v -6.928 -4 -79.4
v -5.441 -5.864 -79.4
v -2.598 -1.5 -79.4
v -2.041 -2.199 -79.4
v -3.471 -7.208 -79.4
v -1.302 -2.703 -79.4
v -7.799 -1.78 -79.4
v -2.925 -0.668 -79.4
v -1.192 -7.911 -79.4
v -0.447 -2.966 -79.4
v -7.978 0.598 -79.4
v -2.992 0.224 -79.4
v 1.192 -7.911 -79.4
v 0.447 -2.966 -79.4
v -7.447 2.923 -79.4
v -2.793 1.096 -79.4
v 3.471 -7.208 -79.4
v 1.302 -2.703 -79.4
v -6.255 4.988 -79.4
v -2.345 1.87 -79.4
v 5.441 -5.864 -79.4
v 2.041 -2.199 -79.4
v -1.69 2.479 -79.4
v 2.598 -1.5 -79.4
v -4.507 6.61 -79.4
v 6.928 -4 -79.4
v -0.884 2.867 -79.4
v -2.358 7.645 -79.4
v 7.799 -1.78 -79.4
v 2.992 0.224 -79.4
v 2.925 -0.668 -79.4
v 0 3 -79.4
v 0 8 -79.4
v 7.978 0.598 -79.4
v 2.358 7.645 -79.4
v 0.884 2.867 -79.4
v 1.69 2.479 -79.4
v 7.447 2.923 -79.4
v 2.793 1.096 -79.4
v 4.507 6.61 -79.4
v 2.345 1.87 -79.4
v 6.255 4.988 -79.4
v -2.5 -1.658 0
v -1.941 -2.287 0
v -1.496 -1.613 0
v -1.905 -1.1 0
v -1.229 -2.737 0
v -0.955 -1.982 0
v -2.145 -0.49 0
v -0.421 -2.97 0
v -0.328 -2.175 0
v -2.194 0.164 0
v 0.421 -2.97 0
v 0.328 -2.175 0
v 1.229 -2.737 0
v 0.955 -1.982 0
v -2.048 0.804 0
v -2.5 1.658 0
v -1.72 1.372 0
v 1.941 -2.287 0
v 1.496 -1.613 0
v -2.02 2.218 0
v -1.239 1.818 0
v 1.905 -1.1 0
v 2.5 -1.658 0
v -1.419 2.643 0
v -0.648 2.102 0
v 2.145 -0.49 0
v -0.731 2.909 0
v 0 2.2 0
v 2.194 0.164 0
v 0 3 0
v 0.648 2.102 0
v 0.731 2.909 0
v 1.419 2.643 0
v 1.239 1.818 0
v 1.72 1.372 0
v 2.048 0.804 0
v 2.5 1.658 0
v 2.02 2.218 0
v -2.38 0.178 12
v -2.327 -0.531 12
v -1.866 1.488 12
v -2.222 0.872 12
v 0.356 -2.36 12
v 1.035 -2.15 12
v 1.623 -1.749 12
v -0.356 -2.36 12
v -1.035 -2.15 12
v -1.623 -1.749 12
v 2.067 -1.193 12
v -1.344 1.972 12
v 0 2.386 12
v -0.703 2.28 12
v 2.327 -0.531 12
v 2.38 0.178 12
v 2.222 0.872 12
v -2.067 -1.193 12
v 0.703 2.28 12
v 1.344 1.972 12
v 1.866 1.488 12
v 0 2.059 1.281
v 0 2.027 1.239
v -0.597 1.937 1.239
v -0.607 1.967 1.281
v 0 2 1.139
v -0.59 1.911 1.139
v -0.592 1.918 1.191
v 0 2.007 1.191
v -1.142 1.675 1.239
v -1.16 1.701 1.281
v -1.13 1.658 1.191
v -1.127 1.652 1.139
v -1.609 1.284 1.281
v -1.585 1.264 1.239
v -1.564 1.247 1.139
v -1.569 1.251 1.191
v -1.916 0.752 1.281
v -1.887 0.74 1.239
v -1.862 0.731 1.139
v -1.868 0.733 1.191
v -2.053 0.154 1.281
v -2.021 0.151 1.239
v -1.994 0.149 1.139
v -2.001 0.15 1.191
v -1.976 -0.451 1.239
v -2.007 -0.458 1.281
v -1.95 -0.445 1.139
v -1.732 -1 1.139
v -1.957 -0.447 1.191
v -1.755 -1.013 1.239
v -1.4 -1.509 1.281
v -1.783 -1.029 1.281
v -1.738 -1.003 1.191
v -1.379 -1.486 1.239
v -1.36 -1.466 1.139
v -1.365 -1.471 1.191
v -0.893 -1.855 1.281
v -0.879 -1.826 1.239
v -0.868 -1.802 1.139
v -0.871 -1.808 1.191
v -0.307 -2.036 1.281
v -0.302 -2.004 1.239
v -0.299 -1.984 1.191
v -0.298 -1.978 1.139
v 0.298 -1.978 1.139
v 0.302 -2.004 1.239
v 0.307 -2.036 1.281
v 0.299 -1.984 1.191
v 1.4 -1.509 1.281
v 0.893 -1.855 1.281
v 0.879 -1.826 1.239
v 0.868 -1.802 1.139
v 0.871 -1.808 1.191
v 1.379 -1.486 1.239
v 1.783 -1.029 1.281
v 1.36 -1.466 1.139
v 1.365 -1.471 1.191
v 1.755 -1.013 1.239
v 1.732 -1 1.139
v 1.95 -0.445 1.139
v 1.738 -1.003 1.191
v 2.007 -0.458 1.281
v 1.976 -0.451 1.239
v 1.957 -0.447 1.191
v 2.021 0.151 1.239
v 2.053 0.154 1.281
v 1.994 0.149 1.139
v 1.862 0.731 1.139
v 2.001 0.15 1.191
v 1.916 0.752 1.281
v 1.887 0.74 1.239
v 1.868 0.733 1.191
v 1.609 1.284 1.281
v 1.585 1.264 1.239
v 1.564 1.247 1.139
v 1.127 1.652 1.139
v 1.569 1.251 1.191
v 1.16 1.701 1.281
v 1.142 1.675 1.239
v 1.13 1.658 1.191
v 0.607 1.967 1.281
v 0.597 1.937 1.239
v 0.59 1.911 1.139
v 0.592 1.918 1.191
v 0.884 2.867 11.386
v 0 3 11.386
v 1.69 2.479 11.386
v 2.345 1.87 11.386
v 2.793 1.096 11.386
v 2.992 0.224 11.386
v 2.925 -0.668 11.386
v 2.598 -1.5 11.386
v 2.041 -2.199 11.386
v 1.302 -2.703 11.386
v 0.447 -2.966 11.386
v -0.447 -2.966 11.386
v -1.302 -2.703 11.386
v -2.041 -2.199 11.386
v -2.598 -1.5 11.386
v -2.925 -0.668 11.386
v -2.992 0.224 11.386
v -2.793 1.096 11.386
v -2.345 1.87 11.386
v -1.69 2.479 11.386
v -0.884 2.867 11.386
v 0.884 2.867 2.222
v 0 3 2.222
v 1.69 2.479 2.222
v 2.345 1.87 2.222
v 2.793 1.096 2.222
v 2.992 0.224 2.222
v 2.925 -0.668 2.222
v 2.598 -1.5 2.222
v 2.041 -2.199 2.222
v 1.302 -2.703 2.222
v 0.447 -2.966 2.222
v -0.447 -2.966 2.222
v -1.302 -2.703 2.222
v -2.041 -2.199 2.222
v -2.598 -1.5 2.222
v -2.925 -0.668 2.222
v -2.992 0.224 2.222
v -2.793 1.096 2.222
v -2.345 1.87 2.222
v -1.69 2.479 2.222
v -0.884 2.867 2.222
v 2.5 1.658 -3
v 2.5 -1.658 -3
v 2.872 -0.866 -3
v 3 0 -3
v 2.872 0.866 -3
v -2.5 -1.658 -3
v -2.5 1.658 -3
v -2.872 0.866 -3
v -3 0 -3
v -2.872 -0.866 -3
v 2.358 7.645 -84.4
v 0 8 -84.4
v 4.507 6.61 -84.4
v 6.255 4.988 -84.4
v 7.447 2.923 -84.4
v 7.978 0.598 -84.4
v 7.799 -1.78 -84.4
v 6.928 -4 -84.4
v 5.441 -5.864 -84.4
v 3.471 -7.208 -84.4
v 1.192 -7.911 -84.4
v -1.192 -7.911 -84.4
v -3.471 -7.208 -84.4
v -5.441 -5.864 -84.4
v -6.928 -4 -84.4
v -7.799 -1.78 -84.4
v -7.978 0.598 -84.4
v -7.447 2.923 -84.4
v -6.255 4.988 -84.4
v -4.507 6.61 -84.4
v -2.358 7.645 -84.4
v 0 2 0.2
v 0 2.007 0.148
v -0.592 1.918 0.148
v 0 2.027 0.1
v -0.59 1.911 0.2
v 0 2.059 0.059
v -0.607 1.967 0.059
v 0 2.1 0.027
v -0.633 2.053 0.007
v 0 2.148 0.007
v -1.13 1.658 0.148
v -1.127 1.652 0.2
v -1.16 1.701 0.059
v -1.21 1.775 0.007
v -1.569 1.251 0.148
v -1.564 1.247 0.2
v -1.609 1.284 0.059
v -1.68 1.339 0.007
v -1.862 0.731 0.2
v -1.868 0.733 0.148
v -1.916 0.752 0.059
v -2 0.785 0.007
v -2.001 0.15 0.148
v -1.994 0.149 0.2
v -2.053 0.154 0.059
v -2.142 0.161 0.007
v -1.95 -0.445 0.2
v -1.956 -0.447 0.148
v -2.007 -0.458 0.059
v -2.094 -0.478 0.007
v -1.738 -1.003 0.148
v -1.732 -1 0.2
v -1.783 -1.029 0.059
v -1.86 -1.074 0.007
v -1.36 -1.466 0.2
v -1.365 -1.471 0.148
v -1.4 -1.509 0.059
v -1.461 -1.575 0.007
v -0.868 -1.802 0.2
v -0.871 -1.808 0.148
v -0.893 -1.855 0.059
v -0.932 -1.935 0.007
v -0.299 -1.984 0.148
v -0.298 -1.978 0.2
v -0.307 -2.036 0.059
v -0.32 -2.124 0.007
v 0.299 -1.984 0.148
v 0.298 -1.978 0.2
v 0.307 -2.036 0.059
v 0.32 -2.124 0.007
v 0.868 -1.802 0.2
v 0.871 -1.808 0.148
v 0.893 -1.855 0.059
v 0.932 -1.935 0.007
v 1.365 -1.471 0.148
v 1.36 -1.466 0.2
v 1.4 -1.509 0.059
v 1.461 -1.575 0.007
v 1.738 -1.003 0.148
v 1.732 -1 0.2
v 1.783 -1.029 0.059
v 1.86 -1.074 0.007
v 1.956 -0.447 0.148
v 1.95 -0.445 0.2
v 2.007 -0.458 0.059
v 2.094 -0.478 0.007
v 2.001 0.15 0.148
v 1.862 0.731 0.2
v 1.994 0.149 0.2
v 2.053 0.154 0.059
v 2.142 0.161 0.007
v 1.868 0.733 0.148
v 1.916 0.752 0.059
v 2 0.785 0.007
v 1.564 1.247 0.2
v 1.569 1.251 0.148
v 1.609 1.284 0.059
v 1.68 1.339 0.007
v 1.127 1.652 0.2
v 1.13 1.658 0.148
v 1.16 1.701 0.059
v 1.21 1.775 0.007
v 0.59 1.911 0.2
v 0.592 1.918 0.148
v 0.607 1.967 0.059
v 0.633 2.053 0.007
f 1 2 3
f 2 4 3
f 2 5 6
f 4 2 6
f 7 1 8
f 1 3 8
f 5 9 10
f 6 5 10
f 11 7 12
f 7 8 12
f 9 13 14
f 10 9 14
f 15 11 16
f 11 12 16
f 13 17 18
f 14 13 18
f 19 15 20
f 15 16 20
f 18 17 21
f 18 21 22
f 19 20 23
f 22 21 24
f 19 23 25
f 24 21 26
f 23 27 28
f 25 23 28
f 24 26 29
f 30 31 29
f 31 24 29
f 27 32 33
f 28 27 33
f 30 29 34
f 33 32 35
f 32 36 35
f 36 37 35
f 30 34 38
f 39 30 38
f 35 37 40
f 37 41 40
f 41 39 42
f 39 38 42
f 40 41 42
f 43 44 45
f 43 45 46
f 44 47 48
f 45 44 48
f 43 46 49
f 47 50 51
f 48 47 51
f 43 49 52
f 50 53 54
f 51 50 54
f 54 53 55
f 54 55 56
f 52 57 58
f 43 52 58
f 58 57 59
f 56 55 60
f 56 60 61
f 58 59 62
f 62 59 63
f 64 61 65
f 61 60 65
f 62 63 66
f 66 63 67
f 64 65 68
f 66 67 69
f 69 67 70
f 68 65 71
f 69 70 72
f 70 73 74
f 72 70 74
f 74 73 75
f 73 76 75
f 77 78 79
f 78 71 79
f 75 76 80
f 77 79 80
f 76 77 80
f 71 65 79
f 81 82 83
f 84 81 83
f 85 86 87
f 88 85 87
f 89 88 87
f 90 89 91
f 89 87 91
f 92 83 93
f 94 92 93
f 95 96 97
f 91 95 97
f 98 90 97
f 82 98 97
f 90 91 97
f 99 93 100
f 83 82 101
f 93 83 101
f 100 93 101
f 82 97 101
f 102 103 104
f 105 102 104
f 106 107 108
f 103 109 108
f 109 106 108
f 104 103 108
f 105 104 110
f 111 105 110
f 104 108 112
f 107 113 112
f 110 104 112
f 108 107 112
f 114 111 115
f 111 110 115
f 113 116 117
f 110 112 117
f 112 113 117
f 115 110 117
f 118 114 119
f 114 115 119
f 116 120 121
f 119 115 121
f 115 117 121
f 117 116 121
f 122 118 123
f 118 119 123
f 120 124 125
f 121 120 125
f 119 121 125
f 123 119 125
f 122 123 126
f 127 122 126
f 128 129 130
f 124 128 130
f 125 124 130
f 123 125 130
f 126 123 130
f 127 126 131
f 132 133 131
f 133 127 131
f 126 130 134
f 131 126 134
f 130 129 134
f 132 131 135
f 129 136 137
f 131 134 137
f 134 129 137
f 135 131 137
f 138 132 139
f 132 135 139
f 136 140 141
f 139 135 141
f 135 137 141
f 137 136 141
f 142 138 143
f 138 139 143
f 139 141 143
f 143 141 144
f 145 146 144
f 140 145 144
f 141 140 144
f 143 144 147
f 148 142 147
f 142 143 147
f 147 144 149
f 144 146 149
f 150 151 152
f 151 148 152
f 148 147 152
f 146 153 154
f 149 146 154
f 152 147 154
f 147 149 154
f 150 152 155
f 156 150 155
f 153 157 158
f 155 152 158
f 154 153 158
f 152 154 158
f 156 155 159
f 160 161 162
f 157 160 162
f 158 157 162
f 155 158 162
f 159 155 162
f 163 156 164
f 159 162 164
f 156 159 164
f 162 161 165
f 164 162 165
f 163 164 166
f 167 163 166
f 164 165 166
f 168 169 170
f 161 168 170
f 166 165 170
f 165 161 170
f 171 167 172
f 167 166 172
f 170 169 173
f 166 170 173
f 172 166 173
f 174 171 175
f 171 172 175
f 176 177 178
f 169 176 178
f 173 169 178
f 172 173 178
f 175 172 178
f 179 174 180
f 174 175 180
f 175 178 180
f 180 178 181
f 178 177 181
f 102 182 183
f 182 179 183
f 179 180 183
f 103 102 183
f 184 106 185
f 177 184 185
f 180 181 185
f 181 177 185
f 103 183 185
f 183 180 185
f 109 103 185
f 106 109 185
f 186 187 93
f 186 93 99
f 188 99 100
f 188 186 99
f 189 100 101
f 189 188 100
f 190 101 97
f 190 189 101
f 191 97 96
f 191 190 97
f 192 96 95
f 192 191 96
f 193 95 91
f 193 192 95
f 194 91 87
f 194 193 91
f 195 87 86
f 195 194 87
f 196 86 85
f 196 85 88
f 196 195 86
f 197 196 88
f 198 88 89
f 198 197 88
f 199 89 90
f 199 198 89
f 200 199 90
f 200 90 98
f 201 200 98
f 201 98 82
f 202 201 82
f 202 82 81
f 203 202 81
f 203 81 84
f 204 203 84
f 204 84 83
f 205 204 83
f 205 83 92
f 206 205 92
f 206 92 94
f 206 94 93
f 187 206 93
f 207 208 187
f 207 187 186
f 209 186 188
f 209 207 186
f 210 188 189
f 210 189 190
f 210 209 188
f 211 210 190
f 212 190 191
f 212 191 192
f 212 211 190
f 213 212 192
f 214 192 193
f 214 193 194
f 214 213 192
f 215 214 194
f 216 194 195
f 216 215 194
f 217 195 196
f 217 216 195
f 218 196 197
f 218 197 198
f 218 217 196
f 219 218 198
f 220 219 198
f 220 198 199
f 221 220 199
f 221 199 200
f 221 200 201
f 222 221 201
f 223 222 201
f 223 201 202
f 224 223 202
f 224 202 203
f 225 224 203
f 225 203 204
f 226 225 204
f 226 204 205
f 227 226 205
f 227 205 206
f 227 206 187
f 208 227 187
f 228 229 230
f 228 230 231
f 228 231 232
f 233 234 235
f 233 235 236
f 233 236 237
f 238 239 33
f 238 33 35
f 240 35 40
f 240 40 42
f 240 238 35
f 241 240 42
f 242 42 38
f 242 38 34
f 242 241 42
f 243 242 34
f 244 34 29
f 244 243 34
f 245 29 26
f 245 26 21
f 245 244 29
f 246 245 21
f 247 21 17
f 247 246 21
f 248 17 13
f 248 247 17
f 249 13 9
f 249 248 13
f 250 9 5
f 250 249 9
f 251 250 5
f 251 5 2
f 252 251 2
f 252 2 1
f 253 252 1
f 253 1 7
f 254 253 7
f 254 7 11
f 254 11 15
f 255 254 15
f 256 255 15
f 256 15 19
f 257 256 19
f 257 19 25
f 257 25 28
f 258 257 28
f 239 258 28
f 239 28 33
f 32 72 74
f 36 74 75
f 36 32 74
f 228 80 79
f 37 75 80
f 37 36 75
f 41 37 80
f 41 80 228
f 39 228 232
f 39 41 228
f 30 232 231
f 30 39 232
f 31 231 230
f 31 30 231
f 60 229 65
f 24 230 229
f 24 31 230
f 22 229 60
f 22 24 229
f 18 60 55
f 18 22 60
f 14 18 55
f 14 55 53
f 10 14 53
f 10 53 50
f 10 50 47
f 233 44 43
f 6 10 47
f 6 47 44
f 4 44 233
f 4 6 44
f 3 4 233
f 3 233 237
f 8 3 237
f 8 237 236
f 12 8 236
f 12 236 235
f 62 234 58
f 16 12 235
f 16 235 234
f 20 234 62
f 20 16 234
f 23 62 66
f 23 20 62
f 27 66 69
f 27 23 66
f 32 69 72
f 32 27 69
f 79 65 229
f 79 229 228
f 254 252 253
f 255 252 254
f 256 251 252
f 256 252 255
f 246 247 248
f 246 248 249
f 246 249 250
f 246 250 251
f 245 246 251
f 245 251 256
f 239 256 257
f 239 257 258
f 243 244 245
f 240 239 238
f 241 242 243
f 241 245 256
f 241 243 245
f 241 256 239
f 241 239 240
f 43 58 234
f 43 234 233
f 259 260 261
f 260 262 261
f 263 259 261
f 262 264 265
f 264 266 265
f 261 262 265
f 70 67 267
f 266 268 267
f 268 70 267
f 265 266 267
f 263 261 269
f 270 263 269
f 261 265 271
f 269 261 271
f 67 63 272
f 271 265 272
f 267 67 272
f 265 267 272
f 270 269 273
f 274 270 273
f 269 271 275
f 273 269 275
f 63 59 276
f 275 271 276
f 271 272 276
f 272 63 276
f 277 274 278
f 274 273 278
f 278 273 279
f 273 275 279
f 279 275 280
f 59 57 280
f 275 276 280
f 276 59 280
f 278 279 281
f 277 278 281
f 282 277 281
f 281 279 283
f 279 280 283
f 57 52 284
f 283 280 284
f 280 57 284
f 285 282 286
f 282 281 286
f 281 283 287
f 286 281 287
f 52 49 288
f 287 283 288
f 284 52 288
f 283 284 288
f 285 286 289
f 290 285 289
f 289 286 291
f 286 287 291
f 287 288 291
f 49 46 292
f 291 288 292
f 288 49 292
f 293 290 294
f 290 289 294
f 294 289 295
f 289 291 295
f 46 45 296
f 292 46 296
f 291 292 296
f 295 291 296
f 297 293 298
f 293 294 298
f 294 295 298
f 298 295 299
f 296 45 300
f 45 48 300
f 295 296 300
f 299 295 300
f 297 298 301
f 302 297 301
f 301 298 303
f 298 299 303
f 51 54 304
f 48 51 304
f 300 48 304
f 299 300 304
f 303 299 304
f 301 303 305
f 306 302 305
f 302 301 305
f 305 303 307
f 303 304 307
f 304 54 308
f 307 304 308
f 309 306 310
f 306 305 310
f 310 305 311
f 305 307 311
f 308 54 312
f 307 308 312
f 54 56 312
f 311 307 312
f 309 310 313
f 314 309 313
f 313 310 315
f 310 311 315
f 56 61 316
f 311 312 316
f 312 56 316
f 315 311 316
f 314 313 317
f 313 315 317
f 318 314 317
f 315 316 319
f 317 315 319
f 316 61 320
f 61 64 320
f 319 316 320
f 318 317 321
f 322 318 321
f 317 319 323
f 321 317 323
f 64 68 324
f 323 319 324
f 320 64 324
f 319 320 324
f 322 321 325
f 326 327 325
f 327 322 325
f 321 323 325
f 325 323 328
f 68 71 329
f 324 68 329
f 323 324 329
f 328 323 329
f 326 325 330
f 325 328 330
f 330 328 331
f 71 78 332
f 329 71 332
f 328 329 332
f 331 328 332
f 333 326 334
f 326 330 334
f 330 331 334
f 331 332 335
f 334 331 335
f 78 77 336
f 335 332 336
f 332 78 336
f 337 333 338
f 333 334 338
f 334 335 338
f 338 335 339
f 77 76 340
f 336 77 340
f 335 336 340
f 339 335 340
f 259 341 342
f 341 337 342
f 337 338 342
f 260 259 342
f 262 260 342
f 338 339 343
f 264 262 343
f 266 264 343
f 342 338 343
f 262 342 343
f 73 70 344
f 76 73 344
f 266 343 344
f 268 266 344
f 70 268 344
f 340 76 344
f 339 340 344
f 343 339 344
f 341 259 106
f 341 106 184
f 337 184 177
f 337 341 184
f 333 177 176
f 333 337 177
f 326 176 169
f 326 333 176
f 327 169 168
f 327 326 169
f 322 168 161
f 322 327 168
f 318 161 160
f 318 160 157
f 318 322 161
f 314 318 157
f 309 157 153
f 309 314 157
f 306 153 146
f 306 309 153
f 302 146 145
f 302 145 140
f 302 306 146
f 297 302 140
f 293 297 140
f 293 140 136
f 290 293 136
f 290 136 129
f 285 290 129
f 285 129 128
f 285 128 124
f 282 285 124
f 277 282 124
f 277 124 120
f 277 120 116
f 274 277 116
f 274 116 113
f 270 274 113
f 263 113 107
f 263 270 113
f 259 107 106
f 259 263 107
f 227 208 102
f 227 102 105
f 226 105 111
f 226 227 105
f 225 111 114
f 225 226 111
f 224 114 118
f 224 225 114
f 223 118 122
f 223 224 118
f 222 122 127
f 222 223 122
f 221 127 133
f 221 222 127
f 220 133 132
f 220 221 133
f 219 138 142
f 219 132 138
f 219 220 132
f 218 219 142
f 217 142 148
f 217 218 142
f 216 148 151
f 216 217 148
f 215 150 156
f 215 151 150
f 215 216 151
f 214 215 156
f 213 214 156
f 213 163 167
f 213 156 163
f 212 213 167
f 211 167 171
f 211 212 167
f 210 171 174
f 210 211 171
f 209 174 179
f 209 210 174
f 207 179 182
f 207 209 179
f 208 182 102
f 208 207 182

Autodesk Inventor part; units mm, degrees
sketch "Sketch_1" plane through (0, 0, 0) normal (1, 0, 0) x (0, 1, 0)
  line L0 (0, -84.4) -> (0, 0)
  line L1 (0, 0) -> (3, 0)
  line L2 (3, 0) -> (3, -79.4)
  line L3 (3, -79.4) -> (8, -79.4)
  line L4 (8, -79.4) -> (8, -84.4)
  line L5 (8, -84.4) -> (0, -84.4)
  line L6 (0, -84.4) -> (0, 0)
revolve "Revolution1" add sketch "Sketch_1" angle 360 about axis through (0, 0, -84.4) along (0, 0, -1)
sketch "Sketch_2" plane through (0, 0, 0) normal (1, 0, 0) x (0, 1, 0)
  line L0 (0, 0) -> (0, 12)
  line L1 (0, 12) -> (2.3865, 12)
  line L2 (2.3865, 12) -> (3, 11.3865)
  line L3 (3, 11.3865) -> (3, 2.2222)
  line L4 (3, 2.2222) -> (2.0586, 1.2808)
  arc A0 (2.0586, 1.2808) -> (2, 1.1394) centre (2.2, 1.1394) ccw
  line L5 (2, 1.1394) -> (2, 0.2)
  arc A1 (2, 0.2) -> (2.2, 0) centre (2.2, 0.2) ccw
  line L6 (2.2, 0) -> (0, 0)
  line L7 (0, 0) -> (0, 12)
revolve "Revolution2" add sketch "Sketch_2" angle 360 about axis through (0, 0, 0) along (0, 0, -1)
thread "Thread1" size "M6x1" class "6g" standard "ISO Metric profile" full length
sketch "Sketch_8" plane through (0, 0, 0) normal (0, 0, 1) x (1, 0, 0)
  line L0 (-4.5, 5) -> (-4.5, -5)
  line L1 (-4.5, -5) -> (4.5, -5)
  line L2 (4.5, -5) -> (4.5, 5)
  line L3 (4.5, 5) -> (-4.5, 5)
  line L4 (-2.5, -4) -> (2.5, -4)
  line L5 (2.5, -4) -> (2.5, 4)
  line L6 (2.5, 4) -> (-2.5, 4)
  line L7 (-2.5, 4) -> (-2.5, -4)
extrude "Extrusion1" cut sketch "Sketch_8" against normal blind 3
ref_plane "CP1_XY" through (0, 0, -84.4) normal (0, 0, -1) x (1, 0, 0)
ref_plane "CP1_YZ" through (0, 0, -84.4) normal (1, 0, 0) x (0, -1, 0)
ref_plane "CP1_ZX" through (0, 0, -84.4) normal (0, -1, 0) x (0, 0, -1)
ref_plane "CP_P_XY" through (0, 0, -84.4) normal (0, 0, 1) x (1, 0, 0)
ref_plane "CP_P_YZ" through (0, 0, -84.4) normal (1, 0, 0) x (0, 1, 0)
ref_plane "CP_P_ZX" through (0, 0, -84.4) normal (0, 1, 0) x (0, 0, 1)
ref_plane "CP_PL_XY" through (0, 0, -3) normal (0, 0, 1) x (1, 0, 0)
ref_plane "CP_PL_YZ" through (0, 0, -3) normal (1, 0, 0) x (0, 1, 0)
ref_plane "CP_PL_ZX" through (0, 0, -3) normal (0, 1, 0) x (0, 0, 1)
ref_plane "DIM_ZM_XY" through (0, 3, -157) normal (1, 0, 0) x (0, 0, -1)
ref_plane "DIM_ZM_YZ" through (0, 3, -157) normal (0, 0, -1) x (0, 1, 0)
ref_plane "DIM_ZM_ZX" through (0, 3, -157) normal (0, 1, 0) x (1, 0, 0)
ref_plane "DISC_XY" through (0, 0, 5) normal (0, 0, -1) x (1, 0, 0)
ref_plane "DISC_YZ" through (0, 0, 5) normal (1, 0, 0) x (0, -1, 0)
ref_plane "DISC_ZX" through (0, 0, 5) normal (0, -1, 0) x (0, 0, -1)
ref_plane "NUT_6_10_T_1_XY" through (0, 0, -168) normal (0, 0, 1) x (1, 0, 0)
ref_plane "NUT_6_10_T_1_YZ" through (0, 0, -168) normal (1, 0, 0) x (0, 1, 0)
ref_plane "NUT_6_10_T_1_ZX" through (0, 0, -168) normal (0, 1, 0) x (0, 0, 1)
ref_plane "NUT_6_10_T_2_XY" through (0, 0, -165.8) normal (0, 0, 1) x (1, 0, 0)
ref_plane "NUT_6_10_T_2_YZ" through (0, 0, -165.8) normal (1, 0, 0) x (0, 1, 0)
ref_plane "NUT_6_10_T_2_ZX" through (0, 0, -165.8) normal (0, 1, 0) x (0, 0, 1)
ref_plane "NUT_CP_6_10_1_XY" through (0, 0, 10) normal (0, 0, 1) x (1, 0, 0)
ref_plane "NUT_CP_6_10_1_YZ" through (0, 0, 10) normal (1, 0, 0) x (0, 1, 0)
ref_plane "NUT_CP_6_10_1_ZX" through (0, 0, 10) normal (0, 1, 0) x (0, 0, 1)
ref_plane "NUT_CP_6_10_2_XY" through (0, 0, 7.8) normal (0, 0, 1) x (1, 0, 0)
ref_plane "NUT_CP_6_10_2_YZ" through (0, 0, 7.8) normal (1, 0, 0) x (0, 1, 0)
ref_plane "NUT_CP_6_10_2_ZX" through (0, 0, 7.8) normal (0, 1, 0) x (0, 0, 1)
properties part number "4186566 DPDM-Q-50---(r)"
